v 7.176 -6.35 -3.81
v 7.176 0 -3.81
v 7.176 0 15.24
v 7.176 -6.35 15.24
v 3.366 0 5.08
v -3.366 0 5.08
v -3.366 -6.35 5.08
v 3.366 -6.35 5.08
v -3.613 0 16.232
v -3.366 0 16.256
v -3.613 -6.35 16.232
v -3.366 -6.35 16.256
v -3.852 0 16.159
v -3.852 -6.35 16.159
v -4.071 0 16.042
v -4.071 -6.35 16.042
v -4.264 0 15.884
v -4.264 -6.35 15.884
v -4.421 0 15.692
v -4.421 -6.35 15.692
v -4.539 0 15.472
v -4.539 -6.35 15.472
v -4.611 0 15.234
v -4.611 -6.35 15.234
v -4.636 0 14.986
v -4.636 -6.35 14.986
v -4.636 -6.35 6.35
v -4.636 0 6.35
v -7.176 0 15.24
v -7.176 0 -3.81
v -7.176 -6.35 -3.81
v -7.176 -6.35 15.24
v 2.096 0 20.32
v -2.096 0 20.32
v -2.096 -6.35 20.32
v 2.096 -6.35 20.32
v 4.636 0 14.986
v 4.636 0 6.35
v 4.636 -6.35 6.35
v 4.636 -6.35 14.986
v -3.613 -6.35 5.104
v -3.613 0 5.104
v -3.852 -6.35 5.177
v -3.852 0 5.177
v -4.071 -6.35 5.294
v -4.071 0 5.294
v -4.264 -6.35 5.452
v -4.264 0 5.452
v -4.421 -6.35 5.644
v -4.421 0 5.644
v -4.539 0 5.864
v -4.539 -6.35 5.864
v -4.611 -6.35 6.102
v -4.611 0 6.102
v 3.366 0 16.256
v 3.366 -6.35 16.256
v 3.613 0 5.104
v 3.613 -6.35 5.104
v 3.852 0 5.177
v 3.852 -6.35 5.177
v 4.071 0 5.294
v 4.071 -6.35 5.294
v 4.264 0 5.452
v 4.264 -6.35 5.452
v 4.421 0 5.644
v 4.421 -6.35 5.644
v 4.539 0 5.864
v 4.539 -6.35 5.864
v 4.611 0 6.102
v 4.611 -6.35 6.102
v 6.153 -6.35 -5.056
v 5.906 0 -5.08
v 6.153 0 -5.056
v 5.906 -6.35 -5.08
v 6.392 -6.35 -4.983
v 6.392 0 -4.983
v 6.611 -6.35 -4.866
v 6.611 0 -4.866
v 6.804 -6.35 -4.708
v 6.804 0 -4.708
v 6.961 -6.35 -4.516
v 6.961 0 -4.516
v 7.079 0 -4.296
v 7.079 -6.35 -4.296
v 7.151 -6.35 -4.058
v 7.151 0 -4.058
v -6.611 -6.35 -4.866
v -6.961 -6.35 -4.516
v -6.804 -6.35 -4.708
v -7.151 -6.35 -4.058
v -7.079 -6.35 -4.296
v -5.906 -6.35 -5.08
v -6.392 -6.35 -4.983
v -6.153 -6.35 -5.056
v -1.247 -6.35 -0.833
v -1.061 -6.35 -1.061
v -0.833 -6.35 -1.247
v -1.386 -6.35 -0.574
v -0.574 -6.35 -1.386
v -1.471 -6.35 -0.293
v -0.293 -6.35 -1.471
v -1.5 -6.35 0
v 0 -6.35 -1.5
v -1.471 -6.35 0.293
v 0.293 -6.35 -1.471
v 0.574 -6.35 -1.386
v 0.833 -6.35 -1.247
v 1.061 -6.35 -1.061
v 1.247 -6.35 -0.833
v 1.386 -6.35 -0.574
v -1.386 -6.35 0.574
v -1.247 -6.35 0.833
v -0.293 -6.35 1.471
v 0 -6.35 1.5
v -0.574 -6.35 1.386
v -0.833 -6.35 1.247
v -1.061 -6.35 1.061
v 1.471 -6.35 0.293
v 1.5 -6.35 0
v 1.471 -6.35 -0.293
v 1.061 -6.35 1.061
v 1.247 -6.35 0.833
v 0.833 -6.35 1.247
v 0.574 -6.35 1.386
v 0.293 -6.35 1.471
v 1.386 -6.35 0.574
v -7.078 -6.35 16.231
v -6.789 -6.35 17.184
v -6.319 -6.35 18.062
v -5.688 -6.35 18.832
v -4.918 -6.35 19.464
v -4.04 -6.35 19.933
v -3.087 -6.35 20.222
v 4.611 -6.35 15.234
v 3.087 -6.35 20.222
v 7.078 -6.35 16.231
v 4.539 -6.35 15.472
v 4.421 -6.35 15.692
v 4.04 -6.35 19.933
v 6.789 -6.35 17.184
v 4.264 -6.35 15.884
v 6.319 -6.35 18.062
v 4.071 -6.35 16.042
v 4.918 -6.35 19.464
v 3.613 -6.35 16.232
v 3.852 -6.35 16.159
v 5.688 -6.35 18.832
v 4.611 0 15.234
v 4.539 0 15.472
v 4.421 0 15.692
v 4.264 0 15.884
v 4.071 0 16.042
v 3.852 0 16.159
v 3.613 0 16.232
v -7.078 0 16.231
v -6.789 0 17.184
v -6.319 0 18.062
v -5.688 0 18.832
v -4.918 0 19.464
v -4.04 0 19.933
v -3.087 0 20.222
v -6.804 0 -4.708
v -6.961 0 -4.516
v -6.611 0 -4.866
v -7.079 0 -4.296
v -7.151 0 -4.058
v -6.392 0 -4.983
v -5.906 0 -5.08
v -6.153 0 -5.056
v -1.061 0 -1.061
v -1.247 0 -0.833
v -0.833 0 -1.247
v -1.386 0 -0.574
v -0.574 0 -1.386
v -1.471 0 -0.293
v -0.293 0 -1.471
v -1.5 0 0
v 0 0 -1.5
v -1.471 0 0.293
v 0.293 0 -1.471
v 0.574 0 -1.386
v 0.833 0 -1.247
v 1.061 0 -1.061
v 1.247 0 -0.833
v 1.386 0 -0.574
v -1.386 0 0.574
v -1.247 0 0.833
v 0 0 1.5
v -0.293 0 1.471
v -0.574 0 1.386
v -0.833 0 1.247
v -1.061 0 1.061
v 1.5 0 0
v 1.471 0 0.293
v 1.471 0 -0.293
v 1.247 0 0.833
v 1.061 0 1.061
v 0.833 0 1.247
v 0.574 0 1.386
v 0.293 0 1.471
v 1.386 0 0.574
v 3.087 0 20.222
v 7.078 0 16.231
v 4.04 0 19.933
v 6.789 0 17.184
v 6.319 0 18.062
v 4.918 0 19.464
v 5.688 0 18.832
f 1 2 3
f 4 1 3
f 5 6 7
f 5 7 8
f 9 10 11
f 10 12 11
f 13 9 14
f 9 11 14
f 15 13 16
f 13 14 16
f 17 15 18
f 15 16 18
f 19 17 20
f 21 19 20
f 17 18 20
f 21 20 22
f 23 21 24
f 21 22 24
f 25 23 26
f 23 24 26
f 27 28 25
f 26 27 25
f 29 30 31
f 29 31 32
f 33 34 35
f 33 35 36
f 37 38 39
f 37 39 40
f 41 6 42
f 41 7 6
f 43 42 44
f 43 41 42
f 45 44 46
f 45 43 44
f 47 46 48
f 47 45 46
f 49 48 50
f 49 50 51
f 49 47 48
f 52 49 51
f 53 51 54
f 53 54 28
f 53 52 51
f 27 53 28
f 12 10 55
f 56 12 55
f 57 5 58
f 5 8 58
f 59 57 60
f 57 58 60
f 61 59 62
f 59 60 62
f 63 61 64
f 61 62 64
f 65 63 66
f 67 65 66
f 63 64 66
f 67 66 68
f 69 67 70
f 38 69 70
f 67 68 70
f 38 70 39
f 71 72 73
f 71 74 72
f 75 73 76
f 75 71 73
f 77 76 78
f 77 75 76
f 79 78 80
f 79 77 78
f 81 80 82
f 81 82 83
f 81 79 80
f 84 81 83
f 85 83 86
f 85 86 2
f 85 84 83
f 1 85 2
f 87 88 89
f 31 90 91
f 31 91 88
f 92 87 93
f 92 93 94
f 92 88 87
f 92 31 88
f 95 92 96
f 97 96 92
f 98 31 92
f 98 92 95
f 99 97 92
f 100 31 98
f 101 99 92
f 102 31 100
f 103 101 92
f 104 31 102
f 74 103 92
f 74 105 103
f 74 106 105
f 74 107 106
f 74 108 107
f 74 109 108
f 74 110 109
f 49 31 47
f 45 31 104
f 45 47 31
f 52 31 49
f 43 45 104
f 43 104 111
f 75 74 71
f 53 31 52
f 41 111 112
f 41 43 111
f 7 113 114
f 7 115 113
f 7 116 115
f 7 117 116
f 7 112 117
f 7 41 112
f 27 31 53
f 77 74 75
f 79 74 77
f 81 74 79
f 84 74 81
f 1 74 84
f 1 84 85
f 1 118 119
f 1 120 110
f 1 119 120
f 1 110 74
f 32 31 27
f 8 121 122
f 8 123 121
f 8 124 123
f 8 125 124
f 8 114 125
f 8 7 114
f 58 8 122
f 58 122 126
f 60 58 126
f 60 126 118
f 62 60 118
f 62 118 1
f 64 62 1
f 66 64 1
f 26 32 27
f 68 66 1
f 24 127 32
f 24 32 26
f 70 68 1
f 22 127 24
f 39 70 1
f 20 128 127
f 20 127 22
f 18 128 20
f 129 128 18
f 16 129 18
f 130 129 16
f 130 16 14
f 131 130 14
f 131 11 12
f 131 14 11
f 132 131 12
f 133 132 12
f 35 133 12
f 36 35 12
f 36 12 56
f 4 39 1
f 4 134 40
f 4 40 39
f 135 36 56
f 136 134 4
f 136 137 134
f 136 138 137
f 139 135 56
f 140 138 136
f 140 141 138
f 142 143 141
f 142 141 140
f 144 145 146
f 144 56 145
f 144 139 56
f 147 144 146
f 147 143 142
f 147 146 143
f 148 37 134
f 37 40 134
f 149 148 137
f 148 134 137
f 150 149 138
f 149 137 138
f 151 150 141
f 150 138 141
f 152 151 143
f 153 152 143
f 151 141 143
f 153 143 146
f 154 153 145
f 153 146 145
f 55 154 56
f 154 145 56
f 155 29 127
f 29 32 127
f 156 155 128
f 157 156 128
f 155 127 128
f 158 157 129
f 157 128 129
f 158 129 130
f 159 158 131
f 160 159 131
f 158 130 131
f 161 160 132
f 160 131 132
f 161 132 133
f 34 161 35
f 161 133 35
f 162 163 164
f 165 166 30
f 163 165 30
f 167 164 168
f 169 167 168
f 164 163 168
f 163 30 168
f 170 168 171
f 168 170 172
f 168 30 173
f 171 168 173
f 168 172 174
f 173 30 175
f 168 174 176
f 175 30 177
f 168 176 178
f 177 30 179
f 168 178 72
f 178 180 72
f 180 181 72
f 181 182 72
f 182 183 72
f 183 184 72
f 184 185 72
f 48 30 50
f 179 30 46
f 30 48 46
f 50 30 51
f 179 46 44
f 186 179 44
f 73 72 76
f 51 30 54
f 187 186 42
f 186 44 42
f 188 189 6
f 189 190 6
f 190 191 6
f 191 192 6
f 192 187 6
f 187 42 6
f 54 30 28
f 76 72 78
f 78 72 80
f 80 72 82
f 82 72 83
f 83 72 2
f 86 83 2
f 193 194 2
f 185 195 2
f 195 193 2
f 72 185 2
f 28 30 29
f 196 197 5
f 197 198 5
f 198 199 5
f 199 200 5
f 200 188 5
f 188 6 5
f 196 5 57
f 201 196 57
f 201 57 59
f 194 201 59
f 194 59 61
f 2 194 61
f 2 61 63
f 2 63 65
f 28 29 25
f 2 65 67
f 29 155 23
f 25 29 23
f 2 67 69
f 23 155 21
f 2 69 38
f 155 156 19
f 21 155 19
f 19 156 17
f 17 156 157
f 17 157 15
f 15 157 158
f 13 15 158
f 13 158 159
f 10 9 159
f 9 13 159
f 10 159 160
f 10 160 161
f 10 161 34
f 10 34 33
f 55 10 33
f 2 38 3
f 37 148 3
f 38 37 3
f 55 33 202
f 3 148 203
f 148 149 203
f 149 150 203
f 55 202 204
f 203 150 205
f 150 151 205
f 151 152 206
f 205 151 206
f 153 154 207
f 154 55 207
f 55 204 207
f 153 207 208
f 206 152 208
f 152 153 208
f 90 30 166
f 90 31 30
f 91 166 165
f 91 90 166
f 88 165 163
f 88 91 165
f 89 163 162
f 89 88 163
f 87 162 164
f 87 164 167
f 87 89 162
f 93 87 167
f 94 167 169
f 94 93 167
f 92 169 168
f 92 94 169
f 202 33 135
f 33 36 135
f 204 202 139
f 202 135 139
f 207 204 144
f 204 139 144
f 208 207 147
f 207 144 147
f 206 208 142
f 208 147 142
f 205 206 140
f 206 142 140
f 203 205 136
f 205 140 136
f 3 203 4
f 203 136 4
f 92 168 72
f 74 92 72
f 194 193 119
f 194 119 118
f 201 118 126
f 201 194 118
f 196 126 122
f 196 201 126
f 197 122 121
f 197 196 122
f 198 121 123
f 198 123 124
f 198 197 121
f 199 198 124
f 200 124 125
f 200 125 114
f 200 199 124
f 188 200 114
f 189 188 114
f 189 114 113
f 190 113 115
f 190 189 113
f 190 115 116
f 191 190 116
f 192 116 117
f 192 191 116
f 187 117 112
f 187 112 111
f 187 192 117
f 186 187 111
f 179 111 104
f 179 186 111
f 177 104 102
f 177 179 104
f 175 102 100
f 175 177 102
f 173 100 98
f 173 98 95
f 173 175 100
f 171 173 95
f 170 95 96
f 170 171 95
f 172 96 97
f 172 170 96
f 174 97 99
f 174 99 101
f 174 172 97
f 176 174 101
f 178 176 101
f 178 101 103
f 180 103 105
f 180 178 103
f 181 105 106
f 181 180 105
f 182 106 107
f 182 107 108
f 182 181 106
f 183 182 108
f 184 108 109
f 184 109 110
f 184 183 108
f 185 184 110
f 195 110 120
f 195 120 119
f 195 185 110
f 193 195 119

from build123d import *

# Parameters (mm, degrees)
F0_W     = 14.351
F0_H     = 25.4
F0_R     = 1.5
F0_W_2   = 9.271
F0_H_2   = 11.176
F1_DEPTH = 6.35
F2_R     = 5.08
F3_R     = 1.27


with BuildPart() as f1:
    # F0 (on Front) → F1 (new body)
    with BuildSketch(Plane.XZ):
        with Locations((0, 7.62)):
            Rectangle(F0_W, F0_H)
        Circle(F0_R, mode=Mode.SUBTRACT)
        with Locations((0, 10.668)):
            Rectangle(F0_W_2, F0_H_2, mode=Mode.SUBTRACT)
    extrude(amount=F1_DEPTH)

    # F2
    f2_edges = [f1.edges().sort_by_distance(p)[0] for p in [
        (7.1755, -3.175, 20.32),
        (-7.1755, -3.175, 20.32),
    ]]
    fillet(f2_edges, radius=F2_R)

    # F3
    f3_edges = [f1.edges().sort_by_distance(p)[0] for p in [
        (7.1755, -3.175, -5.08),
        (-7.1755, -3.175, -5.08),
        (-4.6355, -3.175, 16.256),
        (4.6355, -3.175, 16.256),
        (-4.6355, -3.175, 5.08),
        (4.6355, -3.175, 5.08),
    ]]
    fillet(f3_edges, radius=F3_R)


solid = f1.part
